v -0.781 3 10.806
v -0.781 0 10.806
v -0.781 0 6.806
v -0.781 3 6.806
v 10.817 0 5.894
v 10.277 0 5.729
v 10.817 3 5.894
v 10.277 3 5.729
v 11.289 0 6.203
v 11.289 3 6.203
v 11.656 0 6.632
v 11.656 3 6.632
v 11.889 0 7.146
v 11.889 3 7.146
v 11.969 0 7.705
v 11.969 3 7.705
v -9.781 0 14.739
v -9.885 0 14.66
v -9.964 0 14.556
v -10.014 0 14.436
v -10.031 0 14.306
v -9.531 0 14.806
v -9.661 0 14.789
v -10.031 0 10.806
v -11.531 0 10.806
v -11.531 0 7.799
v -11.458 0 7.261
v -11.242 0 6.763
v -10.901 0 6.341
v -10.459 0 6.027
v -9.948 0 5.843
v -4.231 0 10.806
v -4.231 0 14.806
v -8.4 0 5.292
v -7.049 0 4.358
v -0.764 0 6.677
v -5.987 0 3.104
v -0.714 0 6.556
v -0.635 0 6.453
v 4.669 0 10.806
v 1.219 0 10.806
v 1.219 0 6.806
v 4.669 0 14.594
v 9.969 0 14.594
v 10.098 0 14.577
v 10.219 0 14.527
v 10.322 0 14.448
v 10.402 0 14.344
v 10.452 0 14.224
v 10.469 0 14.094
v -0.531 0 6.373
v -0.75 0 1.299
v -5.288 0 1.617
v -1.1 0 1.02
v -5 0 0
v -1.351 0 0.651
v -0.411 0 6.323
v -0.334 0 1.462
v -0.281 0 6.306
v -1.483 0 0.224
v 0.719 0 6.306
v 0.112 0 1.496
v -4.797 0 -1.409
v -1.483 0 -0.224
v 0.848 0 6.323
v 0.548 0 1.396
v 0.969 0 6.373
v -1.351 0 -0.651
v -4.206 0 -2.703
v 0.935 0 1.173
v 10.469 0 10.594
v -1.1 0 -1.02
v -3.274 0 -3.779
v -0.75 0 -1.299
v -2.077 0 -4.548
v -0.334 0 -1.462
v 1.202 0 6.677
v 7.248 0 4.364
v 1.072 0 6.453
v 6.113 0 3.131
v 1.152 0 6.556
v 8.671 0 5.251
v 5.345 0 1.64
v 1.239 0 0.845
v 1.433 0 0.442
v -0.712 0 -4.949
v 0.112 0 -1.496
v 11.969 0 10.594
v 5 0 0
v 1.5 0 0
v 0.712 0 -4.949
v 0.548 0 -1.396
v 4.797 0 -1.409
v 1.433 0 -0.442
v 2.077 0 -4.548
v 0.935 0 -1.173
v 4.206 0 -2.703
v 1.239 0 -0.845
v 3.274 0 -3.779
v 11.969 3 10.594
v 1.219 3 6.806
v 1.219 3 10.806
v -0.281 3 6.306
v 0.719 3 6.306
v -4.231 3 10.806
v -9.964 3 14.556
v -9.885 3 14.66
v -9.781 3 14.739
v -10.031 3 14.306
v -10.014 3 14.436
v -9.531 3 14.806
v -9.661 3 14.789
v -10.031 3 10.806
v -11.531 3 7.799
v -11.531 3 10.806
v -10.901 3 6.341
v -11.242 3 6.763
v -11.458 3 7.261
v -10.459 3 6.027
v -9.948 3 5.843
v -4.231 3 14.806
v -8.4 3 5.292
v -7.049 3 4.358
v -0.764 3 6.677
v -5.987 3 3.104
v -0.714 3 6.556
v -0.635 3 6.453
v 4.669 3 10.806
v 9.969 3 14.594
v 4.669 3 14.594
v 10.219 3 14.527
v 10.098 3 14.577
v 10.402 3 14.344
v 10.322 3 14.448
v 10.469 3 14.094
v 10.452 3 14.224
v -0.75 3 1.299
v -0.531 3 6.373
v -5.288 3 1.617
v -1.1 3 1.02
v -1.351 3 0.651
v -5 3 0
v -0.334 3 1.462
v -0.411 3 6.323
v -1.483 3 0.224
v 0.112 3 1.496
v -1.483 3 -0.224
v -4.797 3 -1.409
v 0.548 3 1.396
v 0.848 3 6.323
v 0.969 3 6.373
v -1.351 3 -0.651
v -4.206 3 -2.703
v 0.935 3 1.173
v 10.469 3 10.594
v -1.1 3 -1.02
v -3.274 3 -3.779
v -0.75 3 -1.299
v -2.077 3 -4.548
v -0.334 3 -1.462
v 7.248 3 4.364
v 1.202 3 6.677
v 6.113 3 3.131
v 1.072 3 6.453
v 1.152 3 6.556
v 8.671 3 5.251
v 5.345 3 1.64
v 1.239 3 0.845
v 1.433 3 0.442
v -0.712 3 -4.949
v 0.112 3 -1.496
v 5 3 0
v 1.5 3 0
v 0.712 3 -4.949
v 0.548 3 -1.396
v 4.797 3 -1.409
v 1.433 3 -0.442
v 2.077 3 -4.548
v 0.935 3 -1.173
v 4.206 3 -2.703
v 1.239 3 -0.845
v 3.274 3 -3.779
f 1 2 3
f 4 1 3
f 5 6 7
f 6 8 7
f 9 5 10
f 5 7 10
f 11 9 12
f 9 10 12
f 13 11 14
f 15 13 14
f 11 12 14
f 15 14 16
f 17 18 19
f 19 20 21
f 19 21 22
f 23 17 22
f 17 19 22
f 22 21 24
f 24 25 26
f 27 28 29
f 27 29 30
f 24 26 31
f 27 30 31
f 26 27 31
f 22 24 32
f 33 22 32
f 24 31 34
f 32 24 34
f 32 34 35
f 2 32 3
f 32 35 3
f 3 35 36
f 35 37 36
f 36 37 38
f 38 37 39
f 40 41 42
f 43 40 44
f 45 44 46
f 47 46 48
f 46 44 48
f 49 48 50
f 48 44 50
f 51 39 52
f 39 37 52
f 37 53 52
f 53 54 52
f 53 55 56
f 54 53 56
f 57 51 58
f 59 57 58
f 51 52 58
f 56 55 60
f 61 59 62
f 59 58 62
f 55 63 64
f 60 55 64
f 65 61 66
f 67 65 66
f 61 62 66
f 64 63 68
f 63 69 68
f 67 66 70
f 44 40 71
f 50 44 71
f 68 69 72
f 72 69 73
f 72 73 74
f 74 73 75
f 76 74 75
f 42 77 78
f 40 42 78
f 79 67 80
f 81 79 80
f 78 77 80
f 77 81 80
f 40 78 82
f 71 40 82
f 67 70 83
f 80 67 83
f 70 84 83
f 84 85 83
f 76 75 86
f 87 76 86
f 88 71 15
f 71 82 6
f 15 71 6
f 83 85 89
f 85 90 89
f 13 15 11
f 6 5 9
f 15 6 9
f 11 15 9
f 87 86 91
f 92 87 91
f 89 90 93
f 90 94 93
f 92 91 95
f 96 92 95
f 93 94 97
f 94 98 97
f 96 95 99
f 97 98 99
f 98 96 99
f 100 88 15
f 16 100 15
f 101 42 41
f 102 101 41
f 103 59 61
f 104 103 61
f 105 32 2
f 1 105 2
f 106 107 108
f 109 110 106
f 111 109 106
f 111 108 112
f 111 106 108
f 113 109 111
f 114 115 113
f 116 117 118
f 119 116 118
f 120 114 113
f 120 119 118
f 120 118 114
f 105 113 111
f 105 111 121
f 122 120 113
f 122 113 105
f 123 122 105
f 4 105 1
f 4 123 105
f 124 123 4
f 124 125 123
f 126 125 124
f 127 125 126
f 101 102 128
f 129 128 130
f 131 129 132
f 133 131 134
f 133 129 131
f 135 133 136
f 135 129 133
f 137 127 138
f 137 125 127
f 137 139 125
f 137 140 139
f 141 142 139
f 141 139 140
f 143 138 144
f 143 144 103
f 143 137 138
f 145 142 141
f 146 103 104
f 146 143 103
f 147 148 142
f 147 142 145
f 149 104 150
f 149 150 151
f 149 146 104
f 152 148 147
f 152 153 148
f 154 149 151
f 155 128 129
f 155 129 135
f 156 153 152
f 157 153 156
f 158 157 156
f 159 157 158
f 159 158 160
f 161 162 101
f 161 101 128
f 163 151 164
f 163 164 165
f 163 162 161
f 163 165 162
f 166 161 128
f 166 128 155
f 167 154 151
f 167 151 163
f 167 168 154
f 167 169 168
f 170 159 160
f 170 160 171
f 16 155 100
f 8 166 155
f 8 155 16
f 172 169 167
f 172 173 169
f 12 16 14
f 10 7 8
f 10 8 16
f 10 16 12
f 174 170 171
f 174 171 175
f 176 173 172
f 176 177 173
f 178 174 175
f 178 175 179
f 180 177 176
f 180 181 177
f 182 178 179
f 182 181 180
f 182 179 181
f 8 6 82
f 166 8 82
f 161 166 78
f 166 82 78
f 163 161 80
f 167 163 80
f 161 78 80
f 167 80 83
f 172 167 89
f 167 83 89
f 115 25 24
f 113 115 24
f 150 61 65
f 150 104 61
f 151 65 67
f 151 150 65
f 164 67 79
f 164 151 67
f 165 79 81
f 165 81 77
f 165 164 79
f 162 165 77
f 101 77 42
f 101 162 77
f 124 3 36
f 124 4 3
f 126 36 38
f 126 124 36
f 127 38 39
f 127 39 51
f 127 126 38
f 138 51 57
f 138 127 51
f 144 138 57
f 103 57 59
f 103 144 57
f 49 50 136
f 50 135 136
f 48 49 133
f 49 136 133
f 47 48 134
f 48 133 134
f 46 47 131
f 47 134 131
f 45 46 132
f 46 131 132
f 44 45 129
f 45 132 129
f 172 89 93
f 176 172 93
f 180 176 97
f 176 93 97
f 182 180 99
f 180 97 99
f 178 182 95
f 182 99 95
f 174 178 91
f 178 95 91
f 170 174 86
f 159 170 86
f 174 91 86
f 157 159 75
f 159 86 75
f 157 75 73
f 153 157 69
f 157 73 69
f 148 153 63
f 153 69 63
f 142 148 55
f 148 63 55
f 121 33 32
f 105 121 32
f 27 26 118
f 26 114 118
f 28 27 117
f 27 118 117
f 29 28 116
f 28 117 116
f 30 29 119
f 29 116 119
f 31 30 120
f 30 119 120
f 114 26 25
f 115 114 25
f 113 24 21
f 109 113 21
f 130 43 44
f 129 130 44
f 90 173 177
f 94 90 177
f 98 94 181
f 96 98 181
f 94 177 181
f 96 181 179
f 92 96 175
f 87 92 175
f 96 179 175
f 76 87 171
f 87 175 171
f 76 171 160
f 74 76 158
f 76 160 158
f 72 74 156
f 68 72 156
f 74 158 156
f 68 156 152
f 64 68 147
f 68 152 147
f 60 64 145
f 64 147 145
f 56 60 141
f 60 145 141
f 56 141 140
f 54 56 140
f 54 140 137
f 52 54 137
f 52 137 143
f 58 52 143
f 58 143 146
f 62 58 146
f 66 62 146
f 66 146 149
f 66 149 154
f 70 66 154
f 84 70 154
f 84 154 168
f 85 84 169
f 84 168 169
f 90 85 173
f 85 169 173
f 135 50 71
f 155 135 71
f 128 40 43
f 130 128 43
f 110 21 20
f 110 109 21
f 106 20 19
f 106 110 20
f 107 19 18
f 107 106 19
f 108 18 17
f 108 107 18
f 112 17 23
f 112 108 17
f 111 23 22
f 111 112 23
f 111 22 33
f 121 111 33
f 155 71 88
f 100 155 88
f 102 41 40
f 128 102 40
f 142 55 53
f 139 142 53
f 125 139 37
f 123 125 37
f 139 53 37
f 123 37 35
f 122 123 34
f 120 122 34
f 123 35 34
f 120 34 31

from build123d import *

# Parameters (mm, degrees)
BOSS_EXTRUDE1_DEPTH = 3
SKETCH3_R           = 1.5
CUT_EXTRUDE1_DEPTH  = 3
FILLET1_R           = 2
FILLET2_R           = 0.5


with BuildPart() as part:
    # Sketch2 → Boss-Extrude1 (new body)
    with BuildSketch(Plane(origin=(0, 0, 0), x_dir=(1, 0, 0), z_dir=(0, 1, 0))):
        with BuildLine():
            Line((-11.531388224, -10.806413351), (-10.031388224, -10.806413351))
            Line((-10.031388224, -10.806413351), (-10.031388224, -14.806413351))
            Line((-10.031388224, -14.806413351), (-4.231388224, -14.806413351))
            Line((-4.231388224, -14.806413351), (-4.231388224, -10.806413351))
            Line((-4.231388224, -10.806413351), (-0.781388224, -10.806413351))
            Line((-0.781388224, -10.806413351), (-0.781388224, -6.306413351))
            Line((-0.781388224, -6.306413351), (1.218611776, -6.306413351))
            Line((1.218611776, -6.306413351), (1.218611776, -10.806413351))
            Line((1.218611776, -10.806413351), (4.668611776, -10.806413351))
            Line((4.668611776, -10.806413351), (4.668611776, -14.59443044))
            Line((4.668611776, -14.59443044), (10.468611776, -14.59443044))
            Line((10.468611776, -14.59443044), (10.468611776, -10.59443044))
            Line((10.468611776, -10.59443044), (11.968611776, -10.59443044))
            Line((11.968611776, -10.59443044), (11.968611776, -5.761851858))
            ThreePointArc((11.968611776, -5.761851858), (7.254363967, -4.368466387), (5, 0))
            ThreePointArc((5, 0), (0, 5), (-5, 0))
            ThreePointArc((-5, 0), (-7.028472422, -4.339612176), (-11.531388224, -5.973834769))
            Line((-11.531388224, -5.973834769), (-11.531388224, -10.806413351))
        make_face()
    extrude(amount=BOSS_EXTRUDE1_DEPTH)

    # Sketch3 → Cut-Extrude1 (cut)
    with BuildSketch(Plane(origin=(0, 3, 0), x_dir=(1, 0, 0), z_dir=(0, 1, 0))):
        Circle(SKETCH3_R)
    extrude(amount=-CUT_EXTRUDE1_DEPTH, mode=Mode.SUBTRACT)

    # Fillet1
    fillet1_edges = [part.edges().sort_by_distance(p)[0] for p in [
        (11.968611776, 1.5, 5.761851858),
        (-11.531388224, 1.5, 5.973834769),
    ]]
    fillet(fillet1_edges, radius=FILLET1_R)

    # Fillet2
    fillet2_edges = [part.edges().sort_by_distance(p)[0] for p in [
        (10.468611776, 1.5, 14.59443044),
        (1.218611776, 1.5, 6.306413351),
        (-0.781388224, 1.5, 6.306413351),
        (-10.031388224, 1.5, 14.806413351),
    ]]
    fillet(fillet2_edges, radius=FILLET2_R)


solid = part.part
